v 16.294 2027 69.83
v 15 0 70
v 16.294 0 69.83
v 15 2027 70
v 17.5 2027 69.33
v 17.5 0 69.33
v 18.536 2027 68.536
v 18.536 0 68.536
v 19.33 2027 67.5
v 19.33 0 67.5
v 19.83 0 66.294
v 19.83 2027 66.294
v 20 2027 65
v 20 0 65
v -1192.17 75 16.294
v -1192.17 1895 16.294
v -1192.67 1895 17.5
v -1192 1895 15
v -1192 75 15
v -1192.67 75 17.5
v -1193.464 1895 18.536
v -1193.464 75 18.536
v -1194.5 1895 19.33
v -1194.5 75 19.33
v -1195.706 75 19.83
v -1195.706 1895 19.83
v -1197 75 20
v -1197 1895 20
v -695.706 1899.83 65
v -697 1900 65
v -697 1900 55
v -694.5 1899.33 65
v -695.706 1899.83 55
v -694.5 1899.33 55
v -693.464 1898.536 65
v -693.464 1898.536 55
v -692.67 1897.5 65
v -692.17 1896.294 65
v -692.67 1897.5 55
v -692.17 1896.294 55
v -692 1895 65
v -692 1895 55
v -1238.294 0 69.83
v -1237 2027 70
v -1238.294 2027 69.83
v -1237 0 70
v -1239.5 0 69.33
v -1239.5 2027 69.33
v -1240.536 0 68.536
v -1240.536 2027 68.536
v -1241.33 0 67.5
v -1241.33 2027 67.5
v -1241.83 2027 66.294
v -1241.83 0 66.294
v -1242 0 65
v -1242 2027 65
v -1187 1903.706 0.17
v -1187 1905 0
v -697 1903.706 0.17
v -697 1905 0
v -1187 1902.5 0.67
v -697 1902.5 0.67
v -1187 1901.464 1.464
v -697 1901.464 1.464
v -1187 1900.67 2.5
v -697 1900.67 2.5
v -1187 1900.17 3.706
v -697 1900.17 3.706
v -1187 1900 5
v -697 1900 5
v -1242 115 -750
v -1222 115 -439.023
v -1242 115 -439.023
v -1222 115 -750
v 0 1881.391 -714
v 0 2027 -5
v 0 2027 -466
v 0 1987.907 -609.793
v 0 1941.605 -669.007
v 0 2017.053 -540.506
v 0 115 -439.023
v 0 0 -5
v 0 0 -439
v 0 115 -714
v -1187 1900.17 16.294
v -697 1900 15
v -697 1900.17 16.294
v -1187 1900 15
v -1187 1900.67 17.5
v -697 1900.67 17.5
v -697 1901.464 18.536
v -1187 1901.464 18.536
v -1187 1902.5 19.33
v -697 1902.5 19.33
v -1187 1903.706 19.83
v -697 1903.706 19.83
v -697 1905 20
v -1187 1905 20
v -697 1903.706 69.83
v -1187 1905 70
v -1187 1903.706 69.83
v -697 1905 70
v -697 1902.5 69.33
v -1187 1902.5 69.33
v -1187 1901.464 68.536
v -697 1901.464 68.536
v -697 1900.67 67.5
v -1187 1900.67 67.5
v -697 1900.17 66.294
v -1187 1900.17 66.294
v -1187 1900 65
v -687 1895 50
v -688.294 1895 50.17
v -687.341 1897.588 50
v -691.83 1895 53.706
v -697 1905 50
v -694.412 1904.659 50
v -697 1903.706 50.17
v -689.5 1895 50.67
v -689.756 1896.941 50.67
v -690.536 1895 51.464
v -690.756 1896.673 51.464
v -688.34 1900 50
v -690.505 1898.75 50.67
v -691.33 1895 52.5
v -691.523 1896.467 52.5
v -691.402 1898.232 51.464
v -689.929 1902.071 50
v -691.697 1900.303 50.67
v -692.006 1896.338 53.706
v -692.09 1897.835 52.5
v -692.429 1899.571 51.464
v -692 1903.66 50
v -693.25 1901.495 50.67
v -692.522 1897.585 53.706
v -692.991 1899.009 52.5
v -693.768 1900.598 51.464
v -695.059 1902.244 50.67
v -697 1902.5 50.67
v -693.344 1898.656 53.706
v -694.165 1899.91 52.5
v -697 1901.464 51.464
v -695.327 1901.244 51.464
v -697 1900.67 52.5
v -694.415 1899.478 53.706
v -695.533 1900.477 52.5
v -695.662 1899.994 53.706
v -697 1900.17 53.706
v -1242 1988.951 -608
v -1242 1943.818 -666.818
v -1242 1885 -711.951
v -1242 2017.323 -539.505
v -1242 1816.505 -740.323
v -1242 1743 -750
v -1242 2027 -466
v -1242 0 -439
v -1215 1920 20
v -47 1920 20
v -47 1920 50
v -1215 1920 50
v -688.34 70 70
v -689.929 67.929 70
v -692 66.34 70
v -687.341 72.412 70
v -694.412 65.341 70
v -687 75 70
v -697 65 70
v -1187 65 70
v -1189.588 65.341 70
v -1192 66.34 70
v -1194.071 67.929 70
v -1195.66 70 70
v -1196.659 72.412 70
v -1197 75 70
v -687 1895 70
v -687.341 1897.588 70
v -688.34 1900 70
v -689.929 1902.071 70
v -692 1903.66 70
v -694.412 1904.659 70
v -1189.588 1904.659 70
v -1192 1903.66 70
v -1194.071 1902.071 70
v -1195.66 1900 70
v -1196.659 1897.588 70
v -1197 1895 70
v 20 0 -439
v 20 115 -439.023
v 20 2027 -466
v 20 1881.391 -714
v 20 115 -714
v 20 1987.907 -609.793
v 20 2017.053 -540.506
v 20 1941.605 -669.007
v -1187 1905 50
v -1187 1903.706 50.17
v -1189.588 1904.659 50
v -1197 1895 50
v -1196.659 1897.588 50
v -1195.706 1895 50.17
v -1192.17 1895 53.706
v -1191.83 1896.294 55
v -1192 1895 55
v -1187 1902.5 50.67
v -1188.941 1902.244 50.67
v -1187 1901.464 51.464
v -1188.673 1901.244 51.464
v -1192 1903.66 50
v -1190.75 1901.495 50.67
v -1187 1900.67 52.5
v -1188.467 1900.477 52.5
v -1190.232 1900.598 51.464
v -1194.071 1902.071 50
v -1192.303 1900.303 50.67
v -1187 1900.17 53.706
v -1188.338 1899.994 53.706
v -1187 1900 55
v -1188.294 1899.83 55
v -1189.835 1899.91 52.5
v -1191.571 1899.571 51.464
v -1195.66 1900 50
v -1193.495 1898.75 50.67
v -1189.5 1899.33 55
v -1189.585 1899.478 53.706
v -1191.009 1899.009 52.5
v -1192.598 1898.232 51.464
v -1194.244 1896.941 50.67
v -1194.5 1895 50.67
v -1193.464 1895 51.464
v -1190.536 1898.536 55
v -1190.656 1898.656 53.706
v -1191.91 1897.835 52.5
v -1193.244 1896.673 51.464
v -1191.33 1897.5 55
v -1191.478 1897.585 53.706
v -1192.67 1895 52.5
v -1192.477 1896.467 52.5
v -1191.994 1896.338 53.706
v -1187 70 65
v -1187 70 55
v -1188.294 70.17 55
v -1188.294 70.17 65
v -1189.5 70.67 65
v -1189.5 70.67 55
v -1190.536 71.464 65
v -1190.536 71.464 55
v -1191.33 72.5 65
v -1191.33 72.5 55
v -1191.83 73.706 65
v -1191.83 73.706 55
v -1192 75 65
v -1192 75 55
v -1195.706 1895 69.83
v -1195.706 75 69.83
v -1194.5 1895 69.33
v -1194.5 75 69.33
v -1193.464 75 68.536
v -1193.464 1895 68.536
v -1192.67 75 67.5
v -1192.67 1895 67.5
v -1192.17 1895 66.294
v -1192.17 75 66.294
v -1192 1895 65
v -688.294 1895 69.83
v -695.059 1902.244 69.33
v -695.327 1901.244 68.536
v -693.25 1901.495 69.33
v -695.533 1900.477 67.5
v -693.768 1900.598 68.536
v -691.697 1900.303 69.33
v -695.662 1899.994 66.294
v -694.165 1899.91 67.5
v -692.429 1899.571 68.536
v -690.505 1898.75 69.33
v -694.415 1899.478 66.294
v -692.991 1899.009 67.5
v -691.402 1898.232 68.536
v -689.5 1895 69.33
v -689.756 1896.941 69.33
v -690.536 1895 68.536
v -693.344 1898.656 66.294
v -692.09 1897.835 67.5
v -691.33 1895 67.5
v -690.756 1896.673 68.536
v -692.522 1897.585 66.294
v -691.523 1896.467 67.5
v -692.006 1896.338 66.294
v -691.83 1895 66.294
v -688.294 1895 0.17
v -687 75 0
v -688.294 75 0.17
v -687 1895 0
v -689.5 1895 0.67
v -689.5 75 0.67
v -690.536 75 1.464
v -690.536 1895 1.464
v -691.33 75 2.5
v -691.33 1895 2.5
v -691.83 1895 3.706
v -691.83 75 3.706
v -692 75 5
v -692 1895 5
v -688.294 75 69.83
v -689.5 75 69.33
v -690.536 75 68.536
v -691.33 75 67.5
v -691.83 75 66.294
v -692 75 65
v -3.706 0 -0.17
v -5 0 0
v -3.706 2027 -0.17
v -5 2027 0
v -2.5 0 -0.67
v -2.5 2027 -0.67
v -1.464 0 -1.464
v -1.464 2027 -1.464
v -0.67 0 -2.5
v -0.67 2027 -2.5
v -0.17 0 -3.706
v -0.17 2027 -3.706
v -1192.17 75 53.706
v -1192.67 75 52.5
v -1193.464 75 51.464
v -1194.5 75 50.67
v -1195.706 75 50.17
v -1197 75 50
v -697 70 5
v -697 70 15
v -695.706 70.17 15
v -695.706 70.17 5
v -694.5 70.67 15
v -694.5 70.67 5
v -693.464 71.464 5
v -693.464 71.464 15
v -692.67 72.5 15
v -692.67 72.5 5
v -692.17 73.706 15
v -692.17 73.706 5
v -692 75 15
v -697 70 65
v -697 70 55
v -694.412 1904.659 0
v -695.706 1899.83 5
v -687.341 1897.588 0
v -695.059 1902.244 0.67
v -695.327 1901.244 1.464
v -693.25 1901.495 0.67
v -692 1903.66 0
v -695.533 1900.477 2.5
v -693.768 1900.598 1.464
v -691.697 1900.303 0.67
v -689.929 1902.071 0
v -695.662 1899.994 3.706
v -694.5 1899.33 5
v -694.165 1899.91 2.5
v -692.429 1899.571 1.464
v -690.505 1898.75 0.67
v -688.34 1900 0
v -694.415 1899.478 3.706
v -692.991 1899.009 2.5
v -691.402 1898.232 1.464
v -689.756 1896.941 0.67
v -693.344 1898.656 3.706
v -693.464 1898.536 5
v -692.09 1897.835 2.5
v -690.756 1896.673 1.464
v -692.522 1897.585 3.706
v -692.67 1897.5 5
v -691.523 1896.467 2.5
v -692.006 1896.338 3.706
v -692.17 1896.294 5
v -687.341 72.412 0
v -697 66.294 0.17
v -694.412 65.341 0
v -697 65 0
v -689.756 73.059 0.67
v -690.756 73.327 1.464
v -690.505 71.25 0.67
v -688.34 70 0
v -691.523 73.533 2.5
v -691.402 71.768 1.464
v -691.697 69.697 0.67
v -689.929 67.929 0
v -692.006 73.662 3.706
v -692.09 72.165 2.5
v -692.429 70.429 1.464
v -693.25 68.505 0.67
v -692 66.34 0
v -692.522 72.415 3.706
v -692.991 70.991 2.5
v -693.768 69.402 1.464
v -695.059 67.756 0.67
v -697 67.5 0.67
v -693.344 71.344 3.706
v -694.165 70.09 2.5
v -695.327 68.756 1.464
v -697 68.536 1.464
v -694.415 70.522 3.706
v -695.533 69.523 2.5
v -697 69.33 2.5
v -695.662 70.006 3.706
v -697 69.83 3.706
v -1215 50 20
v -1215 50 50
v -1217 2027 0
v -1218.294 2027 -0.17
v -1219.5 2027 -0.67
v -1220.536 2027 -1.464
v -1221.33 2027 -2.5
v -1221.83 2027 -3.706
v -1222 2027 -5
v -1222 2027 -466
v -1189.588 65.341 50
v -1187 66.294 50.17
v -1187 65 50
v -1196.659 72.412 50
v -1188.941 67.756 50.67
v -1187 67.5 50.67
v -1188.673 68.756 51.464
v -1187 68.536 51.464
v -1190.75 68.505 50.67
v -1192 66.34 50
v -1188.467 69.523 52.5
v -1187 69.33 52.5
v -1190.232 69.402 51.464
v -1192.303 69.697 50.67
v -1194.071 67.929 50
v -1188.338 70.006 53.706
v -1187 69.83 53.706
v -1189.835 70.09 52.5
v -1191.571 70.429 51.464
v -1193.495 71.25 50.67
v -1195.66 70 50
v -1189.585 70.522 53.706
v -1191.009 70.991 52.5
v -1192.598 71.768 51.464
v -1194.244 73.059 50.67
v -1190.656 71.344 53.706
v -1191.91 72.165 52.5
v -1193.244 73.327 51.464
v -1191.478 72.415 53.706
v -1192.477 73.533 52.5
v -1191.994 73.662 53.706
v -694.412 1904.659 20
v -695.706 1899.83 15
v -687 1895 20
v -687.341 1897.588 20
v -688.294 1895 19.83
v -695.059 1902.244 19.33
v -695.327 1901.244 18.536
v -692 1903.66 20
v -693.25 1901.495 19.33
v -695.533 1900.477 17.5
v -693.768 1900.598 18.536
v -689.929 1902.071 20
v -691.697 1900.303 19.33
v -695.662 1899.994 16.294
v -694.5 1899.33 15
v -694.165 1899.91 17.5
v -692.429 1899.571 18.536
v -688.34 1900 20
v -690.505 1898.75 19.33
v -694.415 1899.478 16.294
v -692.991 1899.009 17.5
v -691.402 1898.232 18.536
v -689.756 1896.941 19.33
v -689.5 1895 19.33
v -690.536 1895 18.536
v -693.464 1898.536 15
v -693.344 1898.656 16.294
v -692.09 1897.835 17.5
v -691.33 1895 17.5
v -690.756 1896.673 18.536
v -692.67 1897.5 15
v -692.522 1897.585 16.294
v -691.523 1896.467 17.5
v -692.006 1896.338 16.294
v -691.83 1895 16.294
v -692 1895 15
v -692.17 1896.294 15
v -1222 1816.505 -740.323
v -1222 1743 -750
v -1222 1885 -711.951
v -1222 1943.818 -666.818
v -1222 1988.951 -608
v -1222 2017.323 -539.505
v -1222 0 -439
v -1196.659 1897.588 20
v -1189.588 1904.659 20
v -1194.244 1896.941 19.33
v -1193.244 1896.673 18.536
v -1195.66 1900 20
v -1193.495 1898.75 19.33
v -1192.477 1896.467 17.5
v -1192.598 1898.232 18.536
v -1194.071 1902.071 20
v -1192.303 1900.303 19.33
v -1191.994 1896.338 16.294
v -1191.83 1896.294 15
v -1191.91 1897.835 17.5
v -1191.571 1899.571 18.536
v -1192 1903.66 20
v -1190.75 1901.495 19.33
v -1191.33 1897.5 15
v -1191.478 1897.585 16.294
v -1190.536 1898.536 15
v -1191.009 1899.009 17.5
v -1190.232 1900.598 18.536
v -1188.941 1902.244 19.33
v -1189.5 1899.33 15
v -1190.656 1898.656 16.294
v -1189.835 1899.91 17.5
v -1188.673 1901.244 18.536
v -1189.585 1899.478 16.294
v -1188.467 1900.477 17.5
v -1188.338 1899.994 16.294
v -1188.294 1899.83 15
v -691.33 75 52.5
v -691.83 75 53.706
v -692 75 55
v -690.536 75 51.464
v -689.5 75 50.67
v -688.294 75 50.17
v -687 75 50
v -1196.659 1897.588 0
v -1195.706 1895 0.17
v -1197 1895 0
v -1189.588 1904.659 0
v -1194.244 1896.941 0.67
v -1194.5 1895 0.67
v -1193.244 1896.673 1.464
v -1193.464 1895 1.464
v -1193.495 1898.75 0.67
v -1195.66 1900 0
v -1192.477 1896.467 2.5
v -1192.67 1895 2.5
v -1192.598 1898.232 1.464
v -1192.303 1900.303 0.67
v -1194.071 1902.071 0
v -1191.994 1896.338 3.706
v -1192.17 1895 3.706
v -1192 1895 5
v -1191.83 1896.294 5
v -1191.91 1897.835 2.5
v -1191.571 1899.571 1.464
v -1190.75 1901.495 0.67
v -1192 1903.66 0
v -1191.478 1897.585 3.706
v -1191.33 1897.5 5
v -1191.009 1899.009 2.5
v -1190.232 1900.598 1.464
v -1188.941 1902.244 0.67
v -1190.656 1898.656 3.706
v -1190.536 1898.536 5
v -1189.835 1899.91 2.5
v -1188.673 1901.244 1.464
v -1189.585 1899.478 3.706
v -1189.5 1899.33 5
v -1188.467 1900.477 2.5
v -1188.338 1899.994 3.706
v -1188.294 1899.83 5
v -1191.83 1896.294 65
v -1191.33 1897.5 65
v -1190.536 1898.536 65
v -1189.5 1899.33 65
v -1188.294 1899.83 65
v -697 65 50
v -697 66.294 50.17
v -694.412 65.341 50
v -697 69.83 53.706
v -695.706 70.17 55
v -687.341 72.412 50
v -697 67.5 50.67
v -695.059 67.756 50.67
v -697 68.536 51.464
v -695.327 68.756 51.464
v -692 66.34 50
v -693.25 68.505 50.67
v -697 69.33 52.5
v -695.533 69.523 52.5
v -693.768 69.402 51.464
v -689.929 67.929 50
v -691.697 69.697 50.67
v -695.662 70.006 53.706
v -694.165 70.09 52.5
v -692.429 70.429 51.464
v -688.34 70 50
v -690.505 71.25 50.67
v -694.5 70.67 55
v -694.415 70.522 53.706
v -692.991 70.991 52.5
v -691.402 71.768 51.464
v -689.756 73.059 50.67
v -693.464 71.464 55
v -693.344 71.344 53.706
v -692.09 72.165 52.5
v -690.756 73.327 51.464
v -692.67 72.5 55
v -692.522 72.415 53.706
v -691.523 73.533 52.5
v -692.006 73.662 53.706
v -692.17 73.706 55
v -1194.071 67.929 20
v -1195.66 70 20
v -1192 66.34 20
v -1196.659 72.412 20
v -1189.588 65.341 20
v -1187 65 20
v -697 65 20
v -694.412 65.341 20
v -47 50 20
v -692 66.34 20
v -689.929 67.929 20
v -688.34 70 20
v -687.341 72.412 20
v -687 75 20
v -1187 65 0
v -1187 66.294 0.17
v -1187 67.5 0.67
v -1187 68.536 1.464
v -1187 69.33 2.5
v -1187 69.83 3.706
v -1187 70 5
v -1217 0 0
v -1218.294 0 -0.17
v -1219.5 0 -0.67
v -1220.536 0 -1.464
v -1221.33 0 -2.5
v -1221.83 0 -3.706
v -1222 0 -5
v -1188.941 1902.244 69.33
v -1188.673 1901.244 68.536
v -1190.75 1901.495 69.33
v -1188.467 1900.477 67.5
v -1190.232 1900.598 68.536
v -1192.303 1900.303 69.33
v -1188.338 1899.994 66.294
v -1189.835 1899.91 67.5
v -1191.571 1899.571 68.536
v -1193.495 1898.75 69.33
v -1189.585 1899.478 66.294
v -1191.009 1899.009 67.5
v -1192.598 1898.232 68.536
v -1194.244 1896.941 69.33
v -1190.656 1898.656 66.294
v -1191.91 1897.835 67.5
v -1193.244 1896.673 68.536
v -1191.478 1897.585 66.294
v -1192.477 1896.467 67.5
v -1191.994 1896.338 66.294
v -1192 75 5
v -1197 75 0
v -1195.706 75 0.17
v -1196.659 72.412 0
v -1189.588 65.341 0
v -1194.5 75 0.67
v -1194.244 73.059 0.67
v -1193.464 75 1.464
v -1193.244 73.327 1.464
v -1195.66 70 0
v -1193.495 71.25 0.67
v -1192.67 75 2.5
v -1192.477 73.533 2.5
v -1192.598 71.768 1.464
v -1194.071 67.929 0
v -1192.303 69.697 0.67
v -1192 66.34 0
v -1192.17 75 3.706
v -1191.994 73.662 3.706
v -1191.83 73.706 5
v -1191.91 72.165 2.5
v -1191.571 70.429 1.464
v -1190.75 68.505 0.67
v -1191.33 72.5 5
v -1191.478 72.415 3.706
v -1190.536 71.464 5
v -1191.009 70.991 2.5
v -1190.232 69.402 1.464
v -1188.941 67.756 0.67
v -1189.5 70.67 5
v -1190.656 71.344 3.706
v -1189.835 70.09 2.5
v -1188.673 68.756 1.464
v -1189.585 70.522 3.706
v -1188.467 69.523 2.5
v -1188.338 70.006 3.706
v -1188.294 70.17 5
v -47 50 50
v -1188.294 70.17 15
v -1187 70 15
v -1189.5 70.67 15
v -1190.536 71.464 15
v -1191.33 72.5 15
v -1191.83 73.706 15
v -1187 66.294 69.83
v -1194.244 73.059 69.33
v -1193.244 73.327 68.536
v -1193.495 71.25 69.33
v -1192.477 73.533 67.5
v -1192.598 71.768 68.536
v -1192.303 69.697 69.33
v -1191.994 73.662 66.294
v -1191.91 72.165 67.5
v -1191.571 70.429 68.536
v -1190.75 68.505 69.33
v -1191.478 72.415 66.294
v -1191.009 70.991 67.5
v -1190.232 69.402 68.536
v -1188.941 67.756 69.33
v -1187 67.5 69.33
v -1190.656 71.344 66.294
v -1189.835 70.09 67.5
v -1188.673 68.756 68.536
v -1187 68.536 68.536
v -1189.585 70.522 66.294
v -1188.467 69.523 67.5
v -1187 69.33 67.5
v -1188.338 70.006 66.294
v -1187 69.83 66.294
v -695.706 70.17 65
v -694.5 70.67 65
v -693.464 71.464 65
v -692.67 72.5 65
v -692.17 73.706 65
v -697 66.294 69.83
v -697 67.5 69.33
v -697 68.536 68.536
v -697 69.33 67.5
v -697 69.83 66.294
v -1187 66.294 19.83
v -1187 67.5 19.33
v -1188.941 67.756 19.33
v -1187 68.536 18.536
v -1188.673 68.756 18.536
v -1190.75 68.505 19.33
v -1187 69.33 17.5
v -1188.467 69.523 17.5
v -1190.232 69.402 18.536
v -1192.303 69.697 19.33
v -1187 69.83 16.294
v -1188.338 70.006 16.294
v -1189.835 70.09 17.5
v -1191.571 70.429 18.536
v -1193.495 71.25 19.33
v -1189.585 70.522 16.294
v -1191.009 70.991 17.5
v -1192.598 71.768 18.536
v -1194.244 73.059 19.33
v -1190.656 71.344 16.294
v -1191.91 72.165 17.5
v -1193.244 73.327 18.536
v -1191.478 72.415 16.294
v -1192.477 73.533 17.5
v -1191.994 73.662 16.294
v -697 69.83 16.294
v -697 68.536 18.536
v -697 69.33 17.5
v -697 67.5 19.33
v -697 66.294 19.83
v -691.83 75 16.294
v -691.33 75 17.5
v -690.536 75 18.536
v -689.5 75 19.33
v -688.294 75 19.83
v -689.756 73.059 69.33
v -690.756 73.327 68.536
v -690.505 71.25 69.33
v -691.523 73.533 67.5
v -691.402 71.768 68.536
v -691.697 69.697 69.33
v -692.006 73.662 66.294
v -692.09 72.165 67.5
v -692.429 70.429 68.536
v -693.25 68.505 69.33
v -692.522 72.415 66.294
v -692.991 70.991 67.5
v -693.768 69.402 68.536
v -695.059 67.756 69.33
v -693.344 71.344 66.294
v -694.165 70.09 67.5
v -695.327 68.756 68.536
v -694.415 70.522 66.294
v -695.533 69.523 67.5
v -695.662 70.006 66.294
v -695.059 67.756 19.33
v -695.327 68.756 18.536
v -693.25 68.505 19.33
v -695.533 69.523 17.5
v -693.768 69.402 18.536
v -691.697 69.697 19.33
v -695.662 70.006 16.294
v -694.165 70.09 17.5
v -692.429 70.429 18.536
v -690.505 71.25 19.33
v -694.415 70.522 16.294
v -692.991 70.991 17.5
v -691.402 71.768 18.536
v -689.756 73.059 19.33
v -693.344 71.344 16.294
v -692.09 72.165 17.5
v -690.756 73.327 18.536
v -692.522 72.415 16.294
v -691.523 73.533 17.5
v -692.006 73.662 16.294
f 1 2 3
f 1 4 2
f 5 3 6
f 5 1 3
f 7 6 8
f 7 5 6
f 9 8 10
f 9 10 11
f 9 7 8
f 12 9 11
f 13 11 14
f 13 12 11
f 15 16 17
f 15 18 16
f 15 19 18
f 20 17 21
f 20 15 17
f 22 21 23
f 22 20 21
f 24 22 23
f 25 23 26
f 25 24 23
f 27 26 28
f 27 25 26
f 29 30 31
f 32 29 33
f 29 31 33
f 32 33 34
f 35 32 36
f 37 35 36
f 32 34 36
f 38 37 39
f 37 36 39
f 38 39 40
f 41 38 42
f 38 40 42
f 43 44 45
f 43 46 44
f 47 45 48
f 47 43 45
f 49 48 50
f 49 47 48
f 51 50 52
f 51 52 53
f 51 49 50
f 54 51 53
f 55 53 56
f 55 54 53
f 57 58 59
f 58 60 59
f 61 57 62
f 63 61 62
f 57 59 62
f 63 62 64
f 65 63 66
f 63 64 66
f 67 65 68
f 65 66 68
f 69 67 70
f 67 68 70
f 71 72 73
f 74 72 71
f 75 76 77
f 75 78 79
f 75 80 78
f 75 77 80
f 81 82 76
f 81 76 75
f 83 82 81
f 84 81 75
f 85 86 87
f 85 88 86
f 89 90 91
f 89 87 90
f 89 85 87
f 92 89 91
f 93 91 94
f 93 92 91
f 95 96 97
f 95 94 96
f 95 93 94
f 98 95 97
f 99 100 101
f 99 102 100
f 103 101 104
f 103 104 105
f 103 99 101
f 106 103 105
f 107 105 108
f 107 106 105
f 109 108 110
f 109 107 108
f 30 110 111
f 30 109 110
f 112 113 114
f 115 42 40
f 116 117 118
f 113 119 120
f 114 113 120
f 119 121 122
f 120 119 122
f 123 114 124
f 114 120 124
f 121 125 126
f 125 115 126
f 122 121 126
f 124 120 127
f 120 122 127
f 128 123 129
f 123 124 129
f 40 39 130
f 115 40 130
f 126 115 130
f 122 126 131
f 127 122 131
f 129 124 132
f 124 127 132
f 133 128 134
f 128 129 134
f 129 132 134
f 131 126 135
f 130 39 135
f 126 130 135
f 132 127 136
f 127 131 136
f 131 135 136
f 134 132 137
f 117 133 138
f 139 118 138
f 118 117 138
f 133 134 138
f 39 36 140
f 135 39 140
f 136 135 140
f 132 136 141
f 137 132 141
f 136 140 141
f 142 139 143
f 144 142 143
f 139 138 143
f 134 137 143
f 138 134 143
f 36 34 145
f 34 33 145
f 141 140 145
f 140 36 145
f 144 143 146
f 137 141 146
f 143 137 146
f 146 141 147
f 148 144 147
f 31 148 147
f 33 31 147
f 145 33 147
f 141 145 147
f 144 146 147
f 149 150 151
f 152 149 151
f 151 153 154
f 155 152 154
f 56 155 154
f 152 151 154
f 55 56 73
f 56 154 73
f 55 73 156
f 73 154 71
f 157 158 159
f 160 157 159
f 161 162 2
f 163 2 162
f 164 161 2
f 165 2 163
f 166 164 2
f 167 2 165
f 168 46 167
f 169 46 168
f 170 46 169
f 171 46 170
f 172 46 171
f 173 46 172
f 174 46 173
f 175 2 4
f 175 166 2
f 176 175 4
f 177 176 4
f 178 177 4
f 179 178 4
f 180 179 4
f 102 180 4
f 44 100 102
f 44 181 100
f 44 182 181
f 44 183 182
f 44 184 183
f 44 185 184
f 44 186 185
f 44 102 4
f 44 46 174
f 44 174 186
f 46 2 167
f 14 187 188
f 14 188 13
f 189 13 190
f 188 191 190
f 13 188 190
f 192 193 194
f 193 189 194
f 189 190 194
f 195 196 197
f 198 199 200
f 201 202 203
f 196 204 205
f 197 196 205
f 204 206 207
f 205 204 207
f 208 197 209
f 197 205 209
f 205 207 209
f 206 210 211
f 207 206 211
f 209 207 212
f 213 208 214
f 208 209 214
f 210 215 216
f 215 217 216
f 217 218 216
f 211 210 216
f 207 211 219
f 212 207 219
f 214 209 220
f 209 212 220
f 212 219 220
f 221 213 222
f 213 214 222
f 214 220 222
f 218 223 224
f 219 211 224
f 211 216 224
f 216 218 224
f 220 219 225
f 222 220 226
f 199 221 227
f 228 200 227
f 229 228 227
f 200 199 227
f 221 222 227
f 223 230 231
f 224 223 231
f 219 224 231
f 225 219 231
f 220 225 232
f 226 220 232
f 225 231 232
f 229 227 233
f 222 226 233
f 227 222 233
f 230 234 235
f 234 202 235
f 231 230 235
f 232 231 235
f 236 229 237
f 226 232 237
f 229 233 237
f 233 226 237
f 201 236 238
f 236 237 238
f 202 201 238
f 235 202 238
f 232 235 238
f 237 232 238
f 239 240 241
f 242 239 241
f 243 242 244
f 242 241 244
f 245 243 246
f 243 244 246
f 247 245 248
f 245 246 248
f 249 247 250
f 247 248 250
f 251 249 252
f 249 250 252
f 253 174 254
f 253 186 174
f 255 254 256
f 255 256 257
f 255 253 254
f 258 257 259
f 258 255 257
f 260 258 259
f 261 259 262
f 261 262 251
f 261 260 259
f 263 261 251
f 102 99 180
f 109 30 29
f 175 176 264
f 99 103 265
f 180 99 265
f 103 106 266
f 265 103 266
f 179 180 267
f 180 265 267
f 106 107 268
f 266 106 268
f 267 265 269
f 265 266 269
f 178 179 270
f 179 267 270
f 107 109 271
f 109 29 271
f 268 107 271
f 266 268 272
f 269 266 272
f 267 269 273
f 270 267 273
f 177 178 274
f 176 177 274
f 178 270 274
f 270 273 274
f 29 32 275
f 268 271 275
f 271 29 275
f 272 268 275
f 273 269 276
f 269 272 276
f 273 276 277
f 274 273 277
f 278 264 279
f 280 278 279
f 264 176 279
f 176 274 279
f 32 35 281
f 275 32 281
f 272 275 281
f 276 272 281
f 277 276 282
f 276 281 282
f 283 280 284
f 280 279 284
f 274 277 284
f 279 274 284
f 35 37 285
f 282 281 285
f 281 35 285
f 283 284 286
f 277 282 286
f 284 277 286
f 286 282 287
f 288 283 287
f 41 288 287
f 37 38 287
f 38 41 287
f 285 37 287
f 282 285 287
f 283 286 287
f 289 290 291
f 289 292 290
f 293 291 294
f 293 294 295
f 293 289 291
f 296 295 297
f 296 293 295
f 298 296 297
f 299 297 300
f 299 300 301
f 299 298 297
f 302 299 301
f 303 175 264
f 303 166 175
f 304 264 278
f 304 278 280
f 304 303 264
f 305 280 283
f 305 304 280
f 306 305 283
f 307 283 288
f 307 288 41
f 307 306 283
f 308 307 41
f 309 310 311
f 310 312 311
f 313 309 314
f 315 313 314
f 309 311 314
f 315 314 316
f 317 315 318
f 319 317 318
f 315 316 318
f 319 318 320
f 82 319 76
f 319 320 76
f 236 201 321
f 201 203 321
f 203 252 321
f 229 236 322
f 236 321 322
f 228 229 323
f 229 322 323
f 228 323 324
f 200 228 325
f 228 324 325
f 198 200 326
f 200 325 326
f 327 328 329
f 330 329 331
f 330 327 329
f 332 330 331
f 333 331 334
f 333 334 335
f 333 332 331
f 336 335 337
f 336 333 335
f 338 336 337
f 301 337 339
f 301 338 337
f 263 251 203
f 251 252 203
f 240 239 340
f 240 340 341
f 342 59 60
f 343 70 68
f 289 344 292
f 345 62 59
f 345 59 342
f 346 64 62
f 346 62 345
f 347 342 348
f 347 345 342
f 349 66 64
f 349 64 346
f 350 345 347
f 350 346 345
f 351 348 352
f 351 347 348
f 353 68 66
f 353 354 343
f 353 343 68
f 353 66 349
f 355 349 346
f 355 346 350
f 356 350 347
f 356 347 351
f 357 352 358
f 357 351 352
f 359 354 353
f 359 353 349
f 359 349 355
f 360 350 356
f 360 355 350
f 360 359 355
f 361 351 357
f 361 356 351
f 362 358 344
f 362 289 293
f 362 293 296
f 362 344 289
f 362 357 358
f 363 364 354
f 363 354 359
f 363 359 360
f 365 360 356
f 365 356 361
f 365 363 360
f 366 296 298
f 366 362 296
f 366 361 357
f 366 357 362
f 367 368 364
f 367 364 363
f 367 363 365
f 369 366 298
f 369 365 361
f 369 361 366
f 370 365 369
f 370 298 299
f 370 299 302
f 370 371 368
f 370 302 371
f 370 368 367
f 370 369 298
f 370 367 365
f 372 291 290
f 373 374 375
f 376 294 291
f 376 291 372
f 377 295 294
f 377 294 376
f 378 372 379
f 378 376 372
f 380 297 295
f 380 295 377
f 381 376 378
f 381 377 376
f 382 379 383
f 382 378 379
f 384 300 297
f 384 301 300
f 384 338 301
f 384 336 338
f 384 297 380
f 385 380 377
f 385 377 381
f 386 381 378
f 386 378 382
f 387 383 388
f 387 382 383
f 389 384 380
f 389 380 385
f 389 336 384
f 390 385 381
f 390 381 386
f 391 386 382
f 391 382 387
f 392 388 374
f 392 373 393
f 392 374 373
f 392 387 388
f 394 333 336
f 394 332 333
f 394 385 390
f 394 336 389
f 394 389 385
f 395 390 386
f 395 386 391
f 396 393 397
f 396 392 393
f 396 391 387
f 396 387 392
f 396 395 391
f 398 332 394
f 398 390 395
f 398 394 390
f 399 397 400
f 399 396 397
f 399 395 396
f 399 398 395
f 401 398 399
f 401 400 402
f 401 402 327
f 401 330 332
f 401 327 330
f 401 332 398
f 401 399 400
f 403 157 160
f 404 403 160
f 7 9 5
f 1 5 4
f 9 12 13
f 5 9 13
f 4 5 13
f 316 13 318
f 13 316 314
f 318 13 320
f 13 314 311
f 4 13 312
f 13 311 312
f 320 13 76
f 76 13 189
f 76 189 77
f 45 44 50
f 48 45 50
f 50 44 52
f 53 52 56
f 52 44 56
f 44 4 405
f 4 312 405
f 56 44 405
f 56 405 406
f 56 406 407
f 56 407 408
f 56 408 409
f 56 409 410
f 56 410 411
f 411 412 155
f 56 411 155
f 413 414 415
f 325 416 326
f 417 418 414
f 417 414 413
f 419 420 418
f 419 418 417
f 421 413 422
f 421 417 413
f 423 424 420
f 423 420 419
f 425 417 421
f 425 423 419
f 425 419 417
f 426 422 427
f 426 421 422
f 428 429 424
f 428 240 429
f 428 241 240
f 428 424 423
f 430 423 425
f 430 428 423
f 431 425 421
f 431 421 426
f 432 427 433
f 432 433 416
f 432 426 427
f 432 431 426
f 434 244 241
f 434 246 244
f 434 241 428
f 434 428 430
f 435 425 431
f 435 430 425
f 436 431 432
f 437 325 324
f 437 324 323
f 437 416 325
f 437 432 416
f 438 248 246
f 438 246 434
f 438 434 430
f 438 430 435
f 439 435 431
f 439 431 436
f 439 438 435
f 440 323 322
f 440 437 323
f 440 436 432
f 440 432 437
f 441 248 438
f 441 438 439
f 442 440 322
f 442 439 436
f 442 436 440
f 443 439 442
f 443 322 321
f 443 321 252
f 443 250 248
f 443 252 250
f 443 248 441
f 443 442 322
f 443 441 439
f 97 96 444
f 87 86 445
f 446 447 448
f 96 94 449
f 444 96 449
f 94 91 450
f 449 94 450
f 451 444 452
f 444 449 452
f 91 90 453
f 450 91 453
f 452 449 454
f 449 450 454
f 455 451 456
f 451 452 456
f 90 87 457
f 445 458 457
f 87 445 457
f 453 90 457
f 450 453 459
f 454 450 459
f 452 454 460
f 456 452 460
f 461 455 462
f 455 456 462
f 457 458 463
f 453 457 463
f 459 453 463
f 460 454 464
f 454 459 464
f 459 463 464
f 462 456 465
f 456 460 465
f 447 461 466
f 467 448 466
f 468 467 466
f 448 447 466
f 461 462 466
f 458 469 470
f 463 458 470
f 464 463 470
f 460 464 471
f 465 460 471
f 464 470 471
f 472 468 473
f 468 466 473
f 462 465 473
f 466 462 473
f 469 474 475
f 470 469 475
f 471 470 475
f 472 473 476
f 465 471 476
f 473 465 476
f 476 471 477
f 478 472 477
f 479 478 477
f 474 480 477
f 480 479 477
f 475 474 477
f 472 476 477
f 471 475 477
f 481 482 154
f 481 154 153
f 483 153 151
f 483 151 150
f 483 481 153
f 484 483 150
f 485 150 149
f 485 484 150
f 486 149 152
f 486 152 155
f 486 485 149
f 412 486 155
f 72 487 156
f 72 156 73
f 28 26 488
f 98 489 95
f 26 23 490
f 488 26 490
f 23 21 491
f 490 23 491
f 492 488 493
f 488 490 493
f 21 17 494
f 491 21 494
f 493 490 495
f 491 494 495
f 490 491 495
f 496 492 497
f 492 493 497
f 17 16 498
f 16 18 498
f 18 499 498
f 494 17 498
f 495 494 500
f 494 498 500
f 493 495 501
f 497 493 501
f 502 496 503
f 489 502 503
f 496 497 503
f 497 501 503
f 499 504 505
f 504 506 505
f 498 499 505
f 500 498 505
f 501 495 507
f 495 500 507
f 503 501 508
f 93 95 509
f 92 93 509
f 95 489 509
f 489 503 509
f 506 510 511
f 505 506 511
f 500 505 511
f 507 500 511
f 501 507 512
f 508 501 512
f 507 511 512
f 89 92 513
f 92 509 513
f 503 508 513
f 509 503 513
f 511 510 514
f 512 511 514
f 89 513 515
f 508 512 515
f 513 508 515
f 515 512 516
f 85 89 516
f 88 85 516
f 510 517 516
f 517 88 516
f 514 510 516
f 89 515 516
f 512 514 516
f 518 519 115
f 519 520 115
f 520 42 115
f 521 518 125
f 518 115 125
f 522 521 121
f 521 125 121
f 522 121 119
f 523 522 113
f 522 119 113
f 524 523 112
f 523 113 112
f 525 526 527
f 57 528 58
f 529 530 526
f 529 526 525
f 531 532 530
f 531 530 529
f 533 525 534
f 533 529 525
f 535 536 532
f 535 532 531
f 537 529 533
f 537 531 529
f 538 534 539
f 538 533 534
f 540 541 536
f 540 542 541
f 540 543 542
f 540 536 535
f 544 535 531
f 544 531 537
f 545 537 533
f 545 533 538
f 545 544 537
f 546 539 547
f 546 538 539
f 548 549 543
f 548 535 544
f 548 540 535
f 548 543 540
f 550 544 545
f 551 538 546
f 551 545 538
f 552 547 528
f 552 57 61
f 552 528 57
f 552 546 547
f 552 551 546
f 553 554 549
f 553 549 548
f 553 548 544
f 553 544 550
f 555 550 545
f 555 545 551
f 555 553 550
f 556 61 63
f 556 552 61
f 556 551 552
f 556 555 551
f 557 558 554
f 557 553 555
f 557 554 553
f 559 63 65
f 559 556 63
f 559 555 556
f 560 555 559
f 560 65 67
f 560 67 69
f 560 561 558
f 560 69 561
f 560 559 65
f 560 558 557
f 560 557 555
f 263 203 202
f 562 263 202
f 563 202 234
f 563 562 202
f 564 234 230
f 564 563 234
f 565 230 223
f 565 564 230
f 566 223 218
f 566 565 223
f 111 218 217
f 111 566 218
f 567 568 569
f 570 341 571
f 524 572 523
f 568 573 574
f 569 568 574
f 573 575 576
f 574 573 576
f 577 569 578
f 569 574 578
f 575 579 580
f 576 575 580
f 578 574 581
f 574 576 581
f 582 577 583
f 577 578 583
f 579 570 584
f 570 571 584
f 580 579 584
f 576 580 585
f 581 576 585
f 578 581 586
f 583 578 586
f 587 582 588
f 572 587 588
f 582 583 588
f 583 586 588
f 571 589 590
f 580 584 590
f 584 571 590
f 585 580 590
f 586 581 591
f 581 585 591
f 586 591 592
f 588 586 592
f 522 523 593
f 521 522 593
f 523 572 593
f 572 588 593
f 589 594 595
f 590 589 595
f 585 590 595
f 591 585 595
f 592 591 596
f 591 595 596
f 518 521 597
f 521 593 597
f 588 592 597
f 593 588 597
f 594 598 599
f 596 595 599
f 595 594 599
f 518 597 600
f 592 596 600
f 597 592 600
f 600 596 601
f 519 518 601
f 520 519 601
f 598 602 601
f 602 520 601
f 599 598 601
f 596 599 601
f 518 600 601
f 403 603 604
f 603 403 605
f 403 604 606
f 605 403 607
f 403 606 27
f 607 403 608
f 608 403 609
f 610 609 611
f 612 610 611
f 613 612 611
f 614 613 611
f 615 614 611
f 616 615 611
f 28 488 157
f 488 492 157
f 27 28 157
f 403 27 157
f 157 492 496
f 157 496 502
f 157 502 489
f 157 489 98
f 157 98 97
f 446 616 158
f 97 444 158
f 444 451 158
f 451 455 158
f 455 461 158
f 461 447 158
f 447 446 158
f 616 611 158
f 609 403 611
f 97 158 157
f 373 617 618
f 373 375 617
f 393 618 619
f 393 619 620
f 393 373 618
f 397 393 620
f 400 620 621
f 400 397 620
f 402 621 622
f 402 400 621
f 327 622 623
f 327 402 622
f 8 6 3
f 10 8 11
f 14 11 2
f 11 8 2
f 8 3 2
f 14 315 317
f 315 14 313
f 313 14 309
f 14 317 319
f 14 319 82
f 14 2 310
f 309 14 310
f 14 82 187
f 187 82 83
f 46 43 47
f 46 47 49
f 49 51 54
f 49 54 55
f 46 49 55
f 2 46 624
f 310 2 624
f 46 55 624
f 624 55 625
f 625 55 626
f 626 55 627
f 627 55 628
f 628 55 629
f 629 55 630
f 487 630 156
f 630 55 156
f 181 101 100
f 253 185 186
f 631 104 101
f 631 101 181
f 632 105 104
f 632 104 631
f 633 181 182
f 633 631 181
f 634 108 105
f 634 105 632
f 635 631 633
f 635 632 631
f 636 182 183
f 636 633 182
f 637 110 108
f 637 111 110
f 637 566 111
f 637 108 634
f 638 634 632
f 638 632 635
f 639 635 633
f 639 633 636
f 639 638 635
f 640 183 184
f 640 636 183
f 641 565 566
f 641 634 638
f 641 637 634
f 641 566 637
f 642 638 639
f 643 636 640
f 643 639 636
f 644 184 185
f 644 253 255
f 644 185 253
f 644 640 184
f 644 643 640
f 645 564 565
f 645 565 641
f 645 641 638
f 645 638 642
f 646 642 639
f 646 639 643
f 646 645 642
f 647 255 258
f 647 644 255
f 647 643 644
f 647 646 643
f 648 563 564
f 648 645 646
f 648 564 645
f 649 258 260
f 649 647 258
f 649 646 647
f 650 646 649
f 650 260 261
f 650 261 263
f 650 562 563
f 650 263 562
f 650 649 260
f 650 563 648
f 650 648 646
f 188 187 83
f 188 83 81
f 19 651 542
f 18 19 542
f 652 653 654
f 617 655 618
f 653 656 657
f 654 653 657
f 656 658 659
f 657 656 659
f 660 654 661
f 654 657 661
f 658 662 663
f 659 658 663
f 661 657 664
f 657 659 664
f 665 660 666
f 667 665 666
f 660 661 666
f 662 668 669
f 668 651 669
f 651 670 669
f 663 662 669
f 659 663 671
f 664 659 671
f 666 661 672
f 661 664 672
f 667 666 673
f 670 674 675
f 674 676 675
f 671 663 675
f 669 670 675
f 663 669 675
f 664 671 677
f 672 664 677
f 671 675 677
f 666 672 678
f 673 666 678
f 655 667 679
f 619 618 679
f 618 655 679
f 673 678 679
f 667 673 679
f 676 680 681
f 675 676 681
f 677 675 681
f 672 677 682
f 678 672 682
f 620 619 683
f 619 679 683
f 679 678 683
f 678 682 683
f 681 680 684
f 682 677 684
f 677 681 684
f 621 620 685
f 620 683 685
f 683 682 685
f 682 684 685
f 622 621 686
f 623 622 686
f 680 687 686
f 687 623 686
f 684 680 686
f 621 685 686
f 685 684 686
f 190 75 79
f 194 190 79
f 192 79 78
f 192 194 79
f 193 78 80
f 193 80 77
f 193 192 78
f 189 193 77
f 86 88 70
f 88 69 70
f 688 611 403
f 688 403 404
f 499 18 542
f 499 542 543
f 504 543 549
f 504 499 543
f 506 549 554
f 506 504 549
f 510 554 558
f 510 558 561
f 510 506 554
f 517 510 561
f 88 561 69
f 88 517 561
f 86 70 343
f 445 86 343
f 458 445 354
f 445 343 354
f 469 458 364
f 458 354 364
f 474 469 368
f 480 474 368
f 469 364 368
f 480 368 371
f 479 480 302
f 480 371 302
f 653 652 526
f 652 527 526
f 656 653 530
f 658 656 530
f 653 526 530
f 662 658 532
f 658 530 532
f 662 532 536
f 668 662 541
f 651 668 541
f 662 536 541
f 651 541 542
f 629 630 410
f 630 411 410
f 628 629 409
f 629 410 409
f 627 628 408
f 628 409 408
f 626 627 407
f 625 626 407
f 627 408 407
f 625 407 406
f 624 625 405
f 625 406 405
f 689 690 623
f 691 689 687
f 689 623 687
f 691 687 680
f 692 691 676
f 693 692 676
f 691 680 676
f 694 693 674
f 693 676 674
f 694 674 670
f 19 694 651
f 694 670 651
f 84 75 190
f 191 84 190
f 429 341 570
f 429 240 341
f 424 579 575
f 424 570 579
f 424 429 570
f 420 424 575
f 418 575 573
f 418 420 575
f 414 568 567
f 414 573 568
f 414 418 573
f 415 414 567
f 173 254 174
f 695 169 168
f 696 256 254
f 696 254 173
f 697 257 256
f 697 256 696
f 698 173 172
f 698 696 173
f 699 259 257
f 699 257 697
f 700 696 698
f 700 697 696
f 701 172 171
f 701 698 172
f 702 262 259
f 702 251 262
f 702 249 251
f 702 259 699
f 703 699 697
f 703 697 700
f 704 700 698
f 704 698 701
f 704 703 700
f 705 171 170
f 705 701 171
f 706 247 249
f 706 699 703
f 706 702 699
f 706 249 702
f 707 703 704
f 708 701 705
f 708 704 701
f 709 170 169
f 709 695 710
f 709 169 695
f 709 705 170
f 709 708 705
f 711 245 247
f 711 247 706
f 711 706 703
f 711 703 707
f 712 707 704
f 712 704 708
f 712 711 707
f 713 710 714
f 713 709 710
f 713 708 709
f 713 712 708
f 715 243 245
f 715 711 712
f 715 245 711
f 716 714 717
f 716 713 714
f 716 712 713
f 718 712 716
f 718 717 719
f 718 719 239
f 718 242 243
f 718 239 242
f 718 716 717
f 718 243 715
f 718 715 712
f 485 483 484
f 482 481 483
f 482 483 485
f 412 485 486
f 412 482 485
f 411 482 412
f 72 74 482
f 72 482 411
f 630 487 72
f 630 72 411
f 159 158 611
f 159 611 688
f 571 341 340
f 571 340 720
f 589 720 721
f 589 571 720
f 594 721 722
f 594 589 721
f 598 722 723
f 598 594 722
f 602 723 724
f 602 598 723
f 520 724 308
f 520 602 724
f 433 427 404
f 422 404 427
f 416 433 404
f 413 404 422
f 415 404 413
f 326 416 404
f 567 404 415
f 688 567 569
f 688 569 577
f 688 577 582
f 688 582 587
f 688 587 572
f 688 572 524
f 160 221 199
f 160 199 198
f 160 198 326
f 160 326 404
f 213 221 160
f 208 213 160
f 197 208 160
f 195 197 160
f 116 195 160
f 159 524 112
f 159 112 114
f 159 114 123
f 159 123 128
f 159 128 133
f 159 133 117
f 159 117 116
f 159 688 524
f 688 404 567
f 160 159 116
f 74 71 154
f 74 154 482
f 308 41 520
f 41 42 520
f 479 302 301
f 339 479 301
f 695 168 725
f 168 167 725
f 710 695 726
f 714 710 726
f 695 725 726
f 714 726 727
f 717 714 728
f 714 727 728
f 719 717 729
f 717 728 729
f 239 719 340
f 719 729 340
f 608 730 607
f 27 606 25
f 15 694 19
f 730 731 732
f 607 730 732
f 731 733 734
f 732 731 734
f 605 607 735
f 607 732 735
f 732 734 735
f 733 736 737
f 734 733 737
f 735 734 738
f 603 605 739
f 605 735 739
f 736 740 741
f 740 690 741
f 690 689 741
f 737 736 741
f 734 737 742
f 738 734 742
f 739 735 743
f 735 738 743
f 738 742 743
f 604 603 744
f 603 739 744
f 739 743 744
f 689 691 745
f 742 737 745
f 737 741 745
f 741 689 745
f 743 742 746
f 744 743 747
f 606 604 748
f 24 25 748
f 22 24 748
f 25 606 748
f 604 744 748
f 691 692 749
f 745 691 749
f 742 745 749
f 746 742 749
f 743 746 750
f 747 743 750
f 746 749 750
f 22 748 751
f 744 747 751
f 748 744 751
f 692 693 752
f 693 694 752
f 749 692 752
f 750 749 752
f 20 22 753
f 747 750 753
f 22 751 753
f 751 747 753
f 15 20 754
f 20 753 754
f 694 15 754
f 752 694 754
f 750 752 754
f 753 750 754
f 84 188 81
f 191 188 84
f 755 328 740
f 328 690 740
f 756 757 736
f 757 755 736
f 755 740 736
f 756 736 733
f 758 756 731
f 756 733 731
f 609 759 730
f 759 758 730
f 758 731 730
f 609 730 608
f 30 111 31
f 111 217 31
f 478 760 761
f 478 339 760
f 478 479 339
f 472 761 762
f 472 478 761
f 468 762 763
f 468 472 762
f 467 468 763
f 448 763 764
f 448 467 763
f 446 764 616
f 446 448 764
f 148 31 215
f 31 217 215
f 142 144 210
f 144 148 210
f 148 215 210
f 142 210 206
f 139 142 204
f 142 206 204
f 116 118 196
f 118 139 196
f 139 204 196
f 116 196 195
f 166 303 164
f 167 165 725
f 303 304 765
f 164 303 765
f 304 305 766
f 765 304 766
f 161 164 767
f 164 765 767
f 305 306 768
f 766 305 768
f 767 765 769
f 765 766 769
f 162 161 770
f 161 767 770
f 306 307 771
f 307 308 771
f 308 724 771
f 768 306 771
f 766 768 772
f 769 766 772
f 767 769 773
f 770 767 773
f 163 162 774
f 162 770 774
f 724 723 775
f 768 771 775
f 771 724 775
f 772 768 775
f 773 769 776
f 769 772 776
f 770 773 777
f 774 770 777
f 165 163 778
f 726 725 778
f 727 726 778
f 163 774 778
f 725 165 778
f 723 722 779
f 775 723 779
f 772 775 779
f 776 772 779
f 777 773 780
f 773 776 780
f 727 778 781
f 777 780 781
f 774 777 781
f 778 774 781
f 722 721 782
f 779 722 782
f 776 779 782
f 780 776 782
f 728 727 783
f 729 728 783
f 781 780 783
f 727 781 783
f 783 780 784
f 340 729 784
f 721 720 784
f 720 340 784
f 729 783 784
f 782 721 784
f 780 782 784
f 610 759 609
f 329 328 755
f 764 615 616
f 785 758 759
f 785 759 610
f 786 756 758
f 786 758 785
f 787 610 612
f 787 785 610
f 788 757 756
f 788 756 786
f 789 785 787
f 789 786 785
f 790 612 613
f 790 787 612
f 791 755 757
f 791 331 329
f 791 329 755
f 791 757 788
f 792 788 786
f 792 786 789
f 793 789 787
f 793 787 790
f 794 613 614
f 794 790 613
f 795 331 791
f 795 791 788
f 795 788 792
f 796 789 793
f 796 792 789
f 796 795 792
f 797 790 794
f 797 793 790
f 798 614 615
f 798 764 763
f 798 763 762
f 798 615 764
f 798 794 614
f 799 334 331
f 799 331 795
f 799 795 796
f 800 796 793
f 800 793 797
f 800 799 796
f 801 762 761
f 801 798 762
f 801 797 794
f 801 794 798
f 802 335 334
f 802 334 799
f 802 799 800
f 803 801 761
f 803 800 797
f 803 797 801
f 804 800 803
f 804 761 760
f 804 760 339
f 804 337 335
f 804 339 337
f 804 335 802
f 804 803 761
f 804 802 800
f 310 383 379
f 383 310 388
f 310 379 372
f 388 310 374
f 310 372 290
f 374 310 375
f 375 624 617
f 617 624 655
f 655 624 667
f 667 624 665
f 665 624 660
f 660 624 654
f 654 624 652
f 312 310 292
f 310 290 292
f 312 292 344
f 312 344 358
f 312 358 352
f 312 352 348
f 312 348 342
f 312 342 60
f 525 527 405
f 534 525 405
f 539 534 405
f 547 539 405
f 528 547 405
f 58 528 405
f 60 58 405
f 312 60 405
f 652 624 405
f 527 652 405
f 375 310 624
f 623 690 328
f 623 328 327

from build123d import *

# Parameters (mm, degrees)
SURFACE_EXTRUDE1_1_DEPTH = 2027
THICKEN1_T2              = 20
CUT_EXTRUDE1_REACH       = 2504.773
SKETCH3_W                = 500
SKETCH3_H                = 1900
CUT_EXTRUDE2_DEPTH       = 20
BOSS_EXTRUDE1_DEPTH      = 50
SKETCH7_W                = 70
SKETCH7_H                = 70
BOSS_EXTRUDE2_DEPTH      = 500
CUT_EXTRUDE3_DEPTH       = 523
CUT_EXTRUDE3_DEPTH_BACK  = 645
SKETCH6_W                = 30
SKETCH6_H                = 1870
FILLET1_R                = 5
CUT_EXTRUDE4_REACH       = 2504.773
SKETCH9_W                = 20
SKETCH9_H                = 36
CUT_EXTRUDE5_DEPTH       = 1996


with BuildPart() as body_1:
    # Surface-Extrude1: a surface, the sketch's curves swept straight by 2027 mm
    with BuildLine(Plane(origin=(0, 0, 0), x_dir=(1, 0, 0), z_dir=(0, 1, 0)), mode=Mode.PRIVATE) as surface_extrude1_1_path:
        Line((-1222, 750), (-1222, 0))
        Line((-1222, 0), (0, 0))
        Line((0, 0), (0, 750))
    surface_extrude1_1 = Shell.extrude(surface_extrude1_1_path.wire(), (0 * SURFACE_EXTRUDE1_1_DEPTH, 1 * SURFACE_EXTRUDE1_1_DEPTH, 0 * SURFACE_EXTRUDE1_1_DEPTH))
    add(Solid.thicken(surface_extrude1_1, -THICKEN1_T2))

    # Cut-Extrude1: up to this face of the body (flat: up to its plane)
    cut_extrude1_end = Plane(body_1.part.faces().sort_by_distance((-1242, 1013.5, -365))[0])
    # Sketch2 → Cut-Extrude1 (cut, up to the picked face)
    with BuildSketch(Plane(origin=(20, 0, 0), x_dir=(0, 0, -1), z_dir=(1, 0, 0)), mode=Mode.PRIVATE) as cut_extrude1_sk1:
        with BuildLine():
            Line((466, 2027), (750, 2027))
            Line((750, 2027), (750, 1743))
            ThreePointArc((750, 1743), (666.818325857, 1943.818325857), (466, 2027))
        make_face()
    cut_extrude1_tool1 = split(extrude(cut_extrude1_sk1.sketch, amount=-CUT_EXTRUDE1_REACH, mode=Mode.PRIVATE), bisect_by=cut_extrude1_end, keep=Keep.BOTH, mode=Mode.PRIVATE)
    add(cut_extrude1_tool1.solids().sort_by(Axis((20, 1963.563505, -686.563505), (-1, 0, 0)))[0], mode=Mode.SUBTRACT)

    # Sketch3 → Cut-Extrude2 (cut)
    with BuildSketch(Plane.XY.offset(20)):
        with Locations((-942, 950)):
            Rectangle(SKETCH3_W, SKETCH3_H)
    extrude(amount=-CUT_EXTRUDE2_DEPTH, mode=Mode.SUBTRACT)

    # Sketch5 → Boss-Extrude1 (add)
    with BuildSketch(Plane.XY.offset(20)):
        Polygon((20, 0), (20, 2027), (-1242, 2027), (-1242, 0), (-1192, 0), (-1192, 1900), (-692, 1900), (-692, 0), align=None)
    extrude(amount=BOSS_EXTRUDE1_DEPTH)

    # Sketch7 → Boss-Extrude2 (add)
    with BuildSketch(Plane(origin=(-1192, 0, 0), x_dir=(0, 0, -1), z_dir=(1, 0, 0))):
        with Locations((-35, 35)):
            Rectangle(SKETCH7_W, SKETCH7_H)
    extrude(amount=BOSS_EXTRUDE2_DEPTH)

    # Sketch6 → Cut-Extrude3 (cut, two sides: drawn at the far end of the back side and taken through both)
    with BuildSketch(Plane.ZY.offset(692).offset(-CUT_EXTRUDE3_DEPTH_BACK)):
        with Locations((35, 985)):
            Rectangle(SKETCH6_W, SKETCH6_H)
    extrude(amount=CUT_EXTRUDE3_DEPTH + CUT_EXTRUDE3_DEPTH_BACK, mode=Mode.SUBTRACT)

    # Fillet1
    fillet1_edges = [body_1.edges().sort_by_distance(p)[0] for p in [
        (-1242, 1013.5, 70),
        (-942, 1900, 70),
        (-692, 985, 70),
        (-1192, 985, 70),
        (-692, 985, 0),
        (-942, 70, 70),
        (-942, 70, 0),
        (-1192, 70, 10),
        (-692, 70, 10),
        (-692, 70, 60),
        (-1192, 70, 60),
        (-942, 70, 50),
        (-942, 70, 20),
        (-692, 1900, 60),
        (-1192, 1900, 60),
        (-1192, 985, 20),
        (-942, 1900, 20),
        (-692, 985, 20),
        (-692, 985, 50),
        (-942, 1900, 50),
        (-1192, 985, 50),
        (0, 1013.5, 0),
        (-1222, 1013.5, 0),
        (-692, 1900, 10),
        (-942, 1900, 0),
        (-1192, 1900, 10),
        (-1192, 985, 0),
        (20, 1013.5, 70),
    ]]
    fillet(fillet1_edges, radius=FILLET1_R)

    # Sketch8 → Cut-Extrude4 (cut, up to next)
    with BuildSketch(Plane(origin=(20, 0, 0), x_dir=(0, 0, -1), z_dir=(1, 0, 0)), mode=Mode.PRIVATE) as cut_extrude4_sk1:
        Polygon((439, 0), (439.023010168, 115), (750, 115), (750, 0), align=None)
    cut_extrude4_tool1 = extrude(cut_extrude4_sk1.sketch, amount=-CUT_EXTRUDE4_REACH, mode=Mode.PRIVATE) & body_1.part
    add(cut_extrude4_tool1.solids().sort_by_distance((20, 57.499291, -594.505752))[0], mode=Mode.SUBTRACT)
    add(cut_extrude4_tool1.solids().sort_by_distance((20, 57.499291, -594.505752))[1], mode=Mode.SUBTRACT)

    # Sketch9 → Cut-Extrude5 (cut)
    with BuildSketch(Plane(origin=(0, 0, 0), x_dir=(1, 0, 0), z_dir=(0, 1, 0))):
        with Locations((10, 732)):
            Rectangle(SKETCH9_W, SKETCH9_H)
    extrude(amount=CUT_EXTRUDE5_DEPTH, mode=Mode.SUBTRACT)


solid = body_1.part
